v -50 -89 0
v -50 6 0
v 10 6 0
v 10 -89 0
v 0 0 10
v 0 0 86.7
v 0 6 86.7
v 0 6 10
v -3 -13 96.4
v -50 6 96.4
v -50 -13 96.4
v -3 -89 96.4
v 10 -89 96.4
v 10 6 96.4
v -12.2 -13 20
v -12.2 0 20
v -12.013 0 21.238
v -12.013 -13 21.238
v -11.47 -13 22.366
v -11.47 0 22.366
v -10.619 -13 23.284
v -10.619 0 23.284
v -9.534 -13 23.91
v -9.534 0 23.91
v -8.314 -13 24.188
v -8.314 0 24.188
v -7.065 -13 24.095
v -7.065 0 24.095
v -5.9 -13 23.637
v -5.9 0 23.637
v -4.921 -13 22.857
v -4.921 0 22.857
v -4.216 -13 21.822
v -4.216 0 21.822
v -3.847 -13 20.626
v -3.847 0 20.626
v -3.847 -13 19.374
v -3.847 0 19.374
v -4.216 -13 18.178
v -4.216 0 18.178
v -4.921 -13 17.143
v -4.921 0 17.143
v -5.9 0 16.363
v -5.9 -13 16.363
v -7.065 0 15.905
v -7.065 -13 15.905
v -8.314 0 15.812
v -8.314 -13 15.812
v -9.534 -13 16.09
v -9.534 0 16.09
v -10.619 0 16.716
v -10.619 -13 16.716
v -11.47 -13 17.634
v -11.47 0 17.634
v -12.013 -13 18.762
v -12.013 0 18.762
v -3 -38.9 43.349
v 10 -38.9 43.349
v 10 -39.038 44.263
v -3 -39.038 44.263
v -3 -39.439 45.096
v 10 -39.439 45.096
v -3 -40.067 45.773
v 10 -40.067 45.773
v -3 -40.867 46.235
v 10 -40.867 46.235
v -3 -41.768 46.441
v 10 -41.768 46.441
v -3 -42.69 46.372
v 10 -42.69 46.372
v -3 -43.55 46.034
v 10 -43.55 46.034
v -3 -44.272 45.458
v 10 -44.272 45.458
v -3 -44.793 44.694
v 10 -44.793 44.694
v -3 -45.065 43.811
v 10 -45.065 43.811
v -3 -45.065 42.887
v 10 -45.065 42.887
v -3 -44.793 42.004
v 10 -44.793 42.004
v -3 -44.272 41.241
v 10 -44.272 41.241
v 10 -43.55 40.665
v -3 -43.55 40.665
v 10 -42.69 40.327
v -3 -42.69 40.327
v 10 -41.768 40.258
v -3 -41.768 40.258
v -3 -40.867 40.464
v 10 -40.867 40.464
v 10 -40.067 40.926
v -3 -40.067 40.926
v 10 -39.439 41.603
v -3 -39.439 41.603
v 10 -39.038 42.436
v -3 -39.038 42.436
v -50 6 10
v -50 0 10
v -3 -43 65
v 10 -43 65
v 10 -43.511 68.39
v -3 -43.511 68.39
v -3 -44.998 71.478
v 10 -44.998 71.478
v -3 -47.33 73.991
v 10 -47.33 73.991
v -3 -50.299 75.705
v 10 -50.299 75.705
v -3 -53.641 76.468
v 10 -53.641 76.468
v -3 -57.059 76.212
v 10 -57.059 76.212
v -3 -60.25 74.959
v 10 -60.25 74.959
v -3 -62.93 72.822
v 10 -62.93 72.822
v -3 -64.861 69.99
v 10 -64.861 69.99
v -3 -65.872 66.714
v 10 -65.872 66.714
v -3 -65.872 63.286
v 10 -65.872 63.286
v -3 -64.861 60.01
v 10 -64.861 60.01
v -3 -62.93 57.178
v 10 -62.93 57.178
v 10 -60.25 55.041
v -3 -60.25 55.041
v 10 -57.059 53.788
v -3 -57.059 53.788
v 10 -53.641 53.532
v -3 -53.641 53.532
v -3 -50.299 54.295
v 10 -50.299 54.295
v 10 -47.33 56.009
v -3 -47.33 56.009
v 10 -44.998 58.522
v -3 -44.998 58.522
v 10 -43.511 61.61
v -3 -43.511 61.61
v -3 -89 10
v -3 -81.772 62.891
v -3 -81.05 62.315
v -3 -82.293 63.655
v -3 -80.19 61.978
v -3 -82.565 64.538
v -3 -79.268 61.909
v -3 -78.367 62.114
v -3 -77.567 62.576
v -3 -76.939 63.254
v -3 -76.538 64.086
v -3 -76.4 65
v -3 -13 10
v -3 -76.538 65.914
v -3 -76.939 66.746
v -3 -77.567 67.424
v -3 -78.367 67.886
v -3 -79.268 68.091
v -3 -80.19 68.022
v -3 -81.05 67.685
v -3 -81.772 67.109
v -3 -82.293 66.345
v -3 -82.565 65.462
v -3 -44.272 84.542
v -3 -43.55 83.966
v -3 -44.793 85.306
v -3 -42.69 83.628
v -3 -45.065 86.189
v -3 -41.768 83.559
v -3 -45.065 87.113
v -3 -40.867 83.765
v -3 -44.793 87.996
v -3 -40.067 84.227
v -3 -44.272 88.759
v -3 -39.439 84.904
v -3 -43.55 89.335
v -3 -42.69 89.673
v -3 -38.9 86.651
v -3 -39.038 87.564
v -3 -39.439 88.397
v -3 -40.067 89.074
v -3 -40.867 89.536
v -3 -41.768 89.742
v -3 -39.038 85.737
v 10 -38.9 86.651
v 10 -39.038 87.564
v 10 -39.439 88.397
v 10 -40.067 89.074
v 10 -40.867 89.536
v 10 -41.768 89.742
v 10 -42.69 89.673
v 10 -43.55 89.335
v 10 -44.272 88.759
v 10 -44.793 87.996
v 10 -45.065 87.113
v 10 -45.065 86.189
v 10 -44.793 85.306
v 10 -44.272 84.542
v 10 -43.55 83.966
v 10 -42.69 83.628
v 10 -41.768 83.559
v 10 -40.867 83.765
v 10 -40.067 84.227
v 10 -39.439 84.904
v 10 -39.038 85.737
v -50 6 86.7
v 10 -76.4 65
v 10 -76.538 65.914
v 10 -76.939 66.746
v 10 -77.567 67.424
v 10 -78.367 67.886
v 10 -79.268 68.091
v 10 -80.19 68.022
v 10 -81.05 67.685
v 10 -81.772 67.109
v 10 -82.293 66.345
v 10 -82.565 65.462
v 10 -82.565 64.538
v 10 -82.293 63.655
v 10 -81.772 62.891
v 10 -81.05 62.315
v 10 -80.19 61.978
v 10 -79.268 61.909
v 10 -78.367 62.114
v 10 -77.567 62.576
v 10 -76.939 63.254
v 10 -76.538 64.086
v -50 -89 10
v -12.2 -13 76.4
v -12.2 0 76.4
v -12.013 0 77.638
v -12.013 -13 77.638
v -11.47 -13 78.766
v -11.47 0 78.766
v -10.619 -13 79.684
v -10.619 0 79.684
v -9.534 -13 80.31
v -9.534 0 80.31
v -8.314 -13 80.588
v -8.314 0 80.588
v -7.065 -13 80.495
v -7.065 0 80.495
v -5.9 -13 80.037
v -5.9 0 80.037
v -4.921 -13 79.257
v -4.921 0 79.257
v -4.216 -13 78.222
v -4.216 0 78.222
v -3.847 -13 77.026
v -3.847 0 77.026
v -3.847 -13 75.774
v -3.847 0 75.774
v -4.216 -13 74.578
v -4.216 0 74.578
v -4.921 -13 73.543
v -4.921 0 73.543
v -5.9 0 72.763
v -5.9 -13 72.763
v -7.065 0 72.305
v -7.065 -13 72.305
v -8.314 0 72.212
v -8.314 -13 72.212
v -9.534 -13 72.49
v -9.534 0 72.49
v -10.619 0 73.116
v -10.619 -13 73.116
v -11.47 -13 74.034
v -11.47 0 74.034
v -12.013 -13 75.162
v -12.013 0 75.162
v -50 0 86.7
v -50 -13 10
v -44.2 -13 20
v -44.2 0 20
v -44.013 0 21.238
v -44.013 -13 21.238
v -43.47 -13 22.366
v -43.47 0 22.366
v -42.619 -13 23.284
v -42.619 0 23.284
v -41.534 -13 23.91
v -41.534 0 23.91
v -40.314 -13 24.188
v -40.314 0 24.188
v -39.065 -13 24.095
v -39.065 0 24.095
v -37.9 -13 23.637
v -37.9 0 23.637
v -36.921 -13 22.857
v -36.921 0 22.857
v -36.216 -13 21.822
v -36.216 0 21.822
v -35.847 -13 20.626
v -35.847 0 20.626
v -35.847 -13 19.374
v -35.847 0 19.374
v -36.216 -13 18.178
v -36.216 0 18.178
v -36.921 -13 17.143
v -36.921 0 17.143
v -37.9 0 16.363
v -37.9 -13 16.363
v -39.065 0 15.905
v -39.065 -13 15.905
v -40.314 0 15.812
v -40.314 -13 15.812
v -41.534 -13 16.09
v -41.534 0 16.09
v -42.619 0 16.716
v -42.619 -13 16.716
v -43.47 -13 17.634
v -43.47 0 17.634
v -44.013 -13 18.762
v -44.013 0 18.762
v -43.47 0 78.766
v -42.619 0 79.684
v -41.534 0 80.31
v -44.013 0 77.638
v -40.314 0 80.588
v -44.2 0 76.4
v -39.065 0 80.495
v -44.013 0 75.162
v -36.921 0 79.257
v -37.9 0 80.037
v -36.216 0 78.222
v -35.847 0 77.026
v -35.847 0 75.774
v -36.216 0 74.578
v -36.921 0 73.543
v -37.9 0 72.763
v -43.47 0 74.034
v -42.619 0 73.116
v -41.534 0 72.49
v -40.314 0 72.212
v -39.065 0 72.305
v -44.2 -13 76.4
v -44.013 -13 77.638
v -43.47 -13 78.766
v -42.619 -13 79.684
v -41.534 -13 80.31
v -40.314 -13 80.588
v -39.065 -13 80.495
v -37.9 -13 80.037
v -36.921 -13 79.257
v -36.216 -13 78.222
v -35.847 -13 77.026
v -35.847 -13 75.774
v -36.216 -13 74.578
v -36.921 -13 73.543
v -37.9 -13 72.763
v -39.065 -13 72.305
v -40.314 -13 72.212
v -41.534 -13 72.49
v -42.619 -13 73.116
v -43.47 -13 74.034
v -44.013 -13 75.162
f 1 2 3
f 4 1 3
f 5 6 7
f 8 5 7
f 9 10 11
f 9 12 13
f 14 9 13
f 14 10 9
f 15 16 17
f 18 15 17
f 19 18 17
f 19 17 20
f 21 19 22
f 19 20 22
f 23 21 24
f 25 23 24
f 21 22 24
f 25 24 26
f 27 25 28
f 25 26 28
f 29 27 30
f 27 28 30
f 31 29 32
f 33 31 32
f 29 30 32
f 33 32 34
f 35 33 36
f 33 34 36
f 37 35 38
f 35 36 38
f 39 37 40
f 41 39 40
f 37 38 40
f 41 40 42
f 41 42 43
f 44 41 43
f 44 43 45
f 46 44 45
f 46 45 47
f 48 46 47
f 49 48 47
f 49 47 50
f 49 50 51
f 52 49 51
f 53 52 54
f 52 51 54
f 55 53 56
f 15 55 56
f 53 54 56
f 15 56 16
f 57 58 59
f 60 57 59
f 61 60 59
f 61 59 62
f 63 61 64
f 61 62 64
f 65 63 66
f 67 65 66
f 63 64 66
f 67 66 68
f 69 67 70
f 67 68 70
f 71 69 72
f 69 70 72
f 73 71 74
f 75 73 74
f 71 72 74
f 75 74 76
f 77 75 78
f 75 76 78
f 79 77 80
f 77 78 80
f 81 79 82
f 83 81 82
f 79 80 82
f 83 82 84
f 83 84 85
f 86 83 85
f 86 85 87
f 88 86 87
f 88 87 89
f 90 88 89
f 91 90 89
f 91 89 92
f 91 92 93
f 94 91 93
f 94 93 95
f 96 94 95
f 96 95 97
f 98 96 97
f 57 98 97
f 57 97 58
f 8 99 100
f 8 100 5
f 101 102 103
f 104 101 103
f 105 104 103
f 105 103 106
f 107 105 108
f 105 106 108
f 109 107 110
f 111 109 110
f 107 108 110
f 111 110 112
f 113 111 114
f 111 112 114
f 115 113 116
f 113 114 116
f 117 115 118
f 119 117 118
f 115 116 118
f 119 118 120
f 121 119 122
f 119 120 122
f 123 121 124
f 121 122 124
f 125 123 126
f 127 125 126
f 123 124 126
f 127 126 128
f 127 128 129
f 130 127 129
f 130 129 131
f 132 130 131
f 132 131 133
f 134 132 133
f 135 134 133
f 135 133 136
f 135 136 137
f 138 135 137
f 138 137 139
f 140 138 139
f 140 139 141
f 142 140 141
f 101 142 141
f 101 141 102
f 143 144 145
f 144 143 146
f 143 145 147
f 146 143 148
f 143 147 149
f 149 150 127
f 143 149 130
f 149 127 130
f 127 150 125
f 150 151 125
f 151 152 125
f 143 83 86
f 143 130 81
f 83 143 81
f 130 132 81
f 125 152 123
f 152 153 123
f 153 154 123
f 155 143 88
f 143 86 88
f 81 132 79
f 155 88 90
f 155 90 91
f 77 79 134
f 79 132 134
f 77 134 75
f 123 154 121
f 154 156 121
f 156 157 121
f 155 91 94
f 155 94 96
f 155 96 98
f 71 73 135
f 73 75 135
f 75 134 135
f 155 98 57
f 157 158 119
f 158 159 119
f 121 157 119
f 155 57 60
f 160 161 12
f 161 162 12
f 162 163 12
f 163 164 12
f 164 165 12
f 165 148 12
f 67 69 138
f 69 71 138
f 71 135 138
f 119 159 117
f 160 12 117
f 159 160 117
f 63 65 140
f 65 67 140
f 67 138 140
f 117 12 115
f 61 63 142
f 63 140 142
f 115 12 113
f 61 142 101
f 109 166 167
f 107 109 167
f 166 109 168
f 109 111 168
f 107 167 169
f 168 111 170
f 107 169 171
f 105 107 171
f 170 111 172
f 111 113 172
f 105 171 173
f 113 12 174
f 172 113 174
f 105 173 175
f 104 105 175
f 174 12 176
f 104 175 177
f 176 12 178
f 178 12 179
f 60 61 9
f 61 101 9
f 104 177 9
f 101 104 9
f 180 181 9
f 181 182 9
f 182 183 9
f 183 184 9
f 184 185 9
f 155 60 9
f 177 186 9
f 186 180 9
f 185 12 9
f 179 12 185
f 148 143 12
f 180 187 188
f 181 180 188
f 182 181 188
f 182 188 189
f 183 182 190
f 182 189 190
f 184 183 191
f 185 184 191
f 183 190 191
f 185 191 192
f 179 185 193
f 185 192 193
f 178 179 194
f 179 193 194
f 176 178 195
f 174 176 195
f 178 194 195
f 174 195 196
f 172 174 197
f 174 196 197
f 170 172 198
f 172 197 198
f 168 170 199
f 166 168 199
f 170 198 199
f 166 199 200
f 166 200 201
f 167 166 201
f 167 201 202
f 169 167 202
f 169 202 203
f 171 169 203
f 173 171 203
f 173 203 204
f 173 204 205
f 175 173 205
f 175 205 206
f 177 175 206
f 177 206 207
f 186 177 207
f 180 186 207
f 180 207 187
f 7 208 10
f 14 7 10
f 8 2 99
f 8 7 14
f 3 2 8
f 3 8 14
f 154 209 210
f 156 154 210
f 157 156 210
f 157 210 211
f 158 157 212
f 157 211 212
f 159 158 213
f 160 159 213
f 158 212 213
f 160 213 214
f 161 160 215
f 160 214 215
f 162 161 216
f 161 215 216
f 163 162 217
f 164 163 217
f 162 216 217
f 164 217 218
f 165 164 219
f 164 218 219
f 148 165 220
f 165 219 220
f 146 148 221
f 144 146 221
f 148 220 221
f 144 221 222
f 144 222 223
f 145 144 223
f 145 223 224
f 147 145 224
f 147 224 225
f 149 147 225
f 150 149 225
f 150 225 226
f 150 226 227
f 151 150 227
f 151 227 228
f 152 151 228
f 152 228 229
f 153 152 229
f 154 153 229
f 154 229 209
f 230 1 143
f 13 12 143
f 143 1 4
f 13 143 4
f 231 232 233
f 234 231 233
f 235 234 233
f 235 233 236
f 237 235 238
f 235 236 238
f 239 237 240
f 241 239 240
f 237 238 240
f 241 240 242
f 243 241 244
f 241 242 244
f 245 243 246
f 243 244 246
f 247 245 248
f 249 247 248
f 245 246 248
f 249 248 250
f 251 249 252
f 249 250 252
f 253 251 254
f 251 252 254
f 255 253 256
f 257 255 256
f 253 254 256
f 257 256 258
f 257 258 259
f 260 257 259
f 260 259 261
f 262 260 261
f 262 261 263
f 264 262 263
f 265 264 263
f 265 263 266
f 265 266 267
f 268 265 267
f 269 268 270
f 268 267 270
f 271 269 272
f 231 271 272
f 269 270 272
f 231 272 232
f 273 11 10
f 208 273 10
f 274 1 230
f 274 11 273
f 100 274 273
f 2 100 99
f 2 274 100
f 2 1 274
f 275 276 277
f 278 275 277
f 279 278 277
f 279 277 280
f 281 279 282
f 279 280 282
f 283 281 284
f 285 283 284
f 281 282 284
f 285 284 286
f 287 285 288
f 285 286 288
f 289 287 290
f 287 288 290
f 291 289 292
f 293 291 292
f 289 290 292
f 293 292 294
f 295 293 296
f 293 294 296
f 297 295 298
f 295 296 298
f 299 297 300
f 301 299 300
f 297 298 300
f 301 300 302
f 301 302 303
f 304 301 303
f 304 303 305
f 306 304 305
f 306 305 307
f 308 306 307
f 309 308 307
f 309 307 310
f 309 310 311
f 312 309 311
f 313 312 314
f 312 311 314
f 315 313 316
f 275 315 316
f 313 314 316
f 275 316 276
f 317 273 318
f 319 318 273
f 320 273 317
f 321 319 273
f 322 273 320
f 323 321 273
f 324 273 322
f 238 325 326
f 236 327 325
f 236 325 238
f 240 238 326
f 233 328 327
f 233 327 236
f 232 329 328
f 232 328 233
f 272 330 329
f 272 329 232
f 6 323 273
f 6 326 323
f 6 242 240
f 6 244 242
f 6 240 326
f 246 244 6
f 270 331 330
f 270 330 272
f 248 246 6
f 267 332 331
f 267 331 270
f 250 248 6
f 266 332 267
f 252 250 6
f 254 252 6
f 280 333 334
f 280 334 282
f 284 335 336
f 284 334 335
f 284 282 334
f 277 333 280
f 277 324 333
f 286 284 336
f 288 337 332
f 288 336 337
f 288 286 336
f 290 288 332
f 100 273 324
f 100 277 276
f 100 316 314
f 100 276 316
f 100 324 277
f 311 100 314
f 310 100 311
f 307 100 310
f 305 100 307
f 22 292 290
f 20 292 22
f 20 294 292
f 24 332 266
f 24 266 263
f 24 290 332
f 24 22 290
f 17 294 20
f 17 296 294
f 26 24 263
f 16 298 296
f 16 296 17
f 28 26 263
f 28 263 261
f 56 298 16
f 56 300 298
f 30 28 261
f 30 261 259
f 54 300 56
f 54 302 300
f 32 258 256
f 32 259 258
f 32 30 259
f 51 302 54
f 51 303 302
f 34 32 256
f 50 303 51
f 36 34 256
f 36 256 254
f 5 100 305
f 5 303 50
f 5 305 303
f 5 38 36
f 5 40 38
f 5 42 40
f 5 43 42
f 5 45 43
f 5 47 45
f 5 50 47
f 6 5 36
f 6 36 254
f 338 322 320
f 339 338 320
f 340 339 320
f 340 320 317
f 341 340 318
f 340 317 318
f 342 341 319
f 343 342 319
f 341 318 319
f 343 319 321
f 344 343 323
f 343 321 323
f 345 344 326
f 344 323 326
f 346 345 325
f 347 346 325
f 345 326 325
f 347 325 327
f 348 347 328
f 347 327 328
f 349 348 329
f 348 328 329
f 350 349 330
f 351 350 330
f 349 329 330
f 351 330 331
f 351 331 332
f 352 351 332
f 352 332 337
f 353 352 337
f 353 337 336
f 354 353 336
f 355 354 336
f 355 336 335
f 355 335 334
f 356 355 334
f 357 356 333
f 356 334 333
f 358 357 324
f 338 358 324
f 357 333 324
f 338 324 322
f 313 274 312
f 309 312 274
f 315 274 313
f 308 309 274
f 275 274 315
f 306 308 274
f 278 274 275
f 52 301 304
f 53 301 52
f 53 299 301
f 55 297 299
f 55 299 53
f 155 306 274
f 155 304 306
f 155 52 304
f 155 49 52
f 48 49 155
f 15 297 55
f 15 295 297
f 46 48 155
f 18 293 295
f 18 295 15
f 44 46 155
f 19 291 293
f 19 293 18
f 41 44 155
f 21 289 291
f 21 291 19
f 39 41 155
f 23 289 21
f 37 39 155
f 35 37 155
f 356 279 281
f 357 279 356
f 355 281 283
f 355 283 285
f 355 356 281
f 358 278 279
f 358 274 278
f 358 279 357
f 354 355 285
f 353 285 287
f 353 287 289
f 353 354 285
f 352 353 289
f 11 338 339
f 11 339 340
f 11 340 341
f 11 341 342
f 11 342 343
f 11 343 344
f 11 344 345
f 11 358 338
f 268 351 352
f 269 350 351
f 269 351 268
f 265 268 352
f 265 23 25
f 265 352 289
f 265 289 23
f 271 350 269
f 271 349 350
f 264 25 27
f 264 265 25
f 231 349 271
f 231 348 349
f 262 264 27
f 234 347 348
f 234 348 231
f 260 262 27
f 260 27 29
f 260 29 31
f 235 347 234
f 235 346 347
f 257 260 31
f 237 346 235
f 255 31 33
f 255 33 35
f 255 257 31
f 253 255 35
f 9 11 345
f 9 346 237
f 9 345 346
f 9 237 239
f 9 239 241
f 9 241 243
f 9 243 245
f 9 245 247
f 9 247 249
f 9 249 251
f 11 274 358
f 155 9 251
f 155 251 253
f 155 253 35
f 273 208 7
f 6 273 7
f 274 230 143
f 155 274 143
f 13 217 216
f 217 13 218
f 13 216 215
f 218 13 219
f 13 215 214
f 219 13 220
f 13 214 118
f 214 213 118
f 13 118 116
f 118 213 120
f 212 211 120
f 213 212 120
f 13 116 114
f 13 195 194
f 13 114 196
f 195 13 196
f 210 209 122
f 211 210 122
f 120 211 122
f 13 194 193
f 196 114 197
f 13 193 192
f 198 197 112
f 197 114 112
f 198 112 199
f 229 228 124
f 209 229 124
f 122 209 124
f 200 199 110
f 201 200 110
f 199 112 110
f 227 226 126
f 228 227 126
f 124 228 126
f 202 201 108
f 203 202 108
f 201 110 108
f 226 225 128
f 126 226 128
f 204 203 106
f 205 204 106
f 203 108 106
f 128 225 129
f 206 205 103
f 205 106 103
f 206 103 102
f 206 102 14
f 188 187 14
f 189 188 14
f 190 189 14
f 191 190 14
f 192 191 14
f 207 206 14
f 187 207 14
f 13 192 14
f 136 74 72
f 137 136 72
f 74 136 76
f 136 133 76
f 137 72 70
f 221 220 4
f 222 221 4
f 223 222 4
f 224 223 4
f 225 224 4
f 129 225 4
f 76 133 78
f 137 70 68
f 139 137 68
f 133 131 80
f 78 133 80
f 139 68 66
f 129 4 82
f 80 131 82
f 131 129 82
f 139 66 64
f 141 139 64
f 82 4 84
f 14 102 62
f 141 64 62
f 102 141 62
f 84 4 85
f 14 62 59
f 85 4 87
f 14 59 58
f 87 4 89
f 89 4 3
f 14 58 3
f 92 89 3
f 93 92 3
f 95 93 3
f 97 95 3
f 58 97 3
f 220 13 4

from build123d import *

# Parameters (mm, degrees)
BOX_W           = 100
BOX_H           = 6
BOX_DEPTH       = 76.7
SKETCH_W        = 60
SKETCH_H        = 95
PAD_DEPTH       = 96.4
SKETCH001_W     = 90
SKETCH001_H     = 90
POCKET_DEPTH    = 86.4
SKETCH003_R     = 11.5
SKETCH003_R_2   = 3.1
POCKET001_DEPTH = 20
SKETCH004_R     = 4.2
POCKET002_DEPTH = 13


with BuildPart() as crossbeam_slot:
    # Box → Box (new body)
    with BuildSketch(Plane(origin=(-100, 0, 10), x_dir=(1, 0, 0), z_dir=(0, 0, 1))):
        with Locations((50, 3)):
            Rectangle(BOX_W, BOX_H)
    extrude(amount=BOX_DEPTH)


with BuildPart() as pocket002:
    # Sketch → Pad (new body)
    with BuildSketch(Plane.XY):
        with Locations((-20, -41.5)):
            Rectangle(SKETCH_W, SKETCH_H)
    extrude(amount=PAD_DEPTH)

    # Cut: cut Crossbeam Slot
    add(crossbeam_slot.part, mode=Mode.SUBTRACT)

    # Sketch001 → Pocket (cut)
    with BuildSketch(Plane.XY.offset(96.4)):
        with Locations((-48, -58)):
            Rectangle(SKETCH001_W, SKETCH001_H)
    extrude(amount=-POCKET_DEPTH, mode=Mode.SUBTRACT)

    # Sketch003 → Pocket001 (cut)
    with BuildSketch(Plane.YZ.offset(10)):
        with Locations((-54.5, 65)):
            Circle(SKETCH003_R)
        with Locations((-42, 43.349365)):
            Circle(SKETCH003_R_2)
        with Locations((-42, 86.650635)):
            Circle(SKETCH003_R_2)
        with Locations((-79.5, 65)):
            Circle(SKETCH003_R_2)
    extrude(amount=-POCKET001_DEPTH, mode=Mode.SUBTRACT)

    # Sketch004 → Pocket002 (cut)
    with BuildSketch(Plane(origin=(0, 0, 0), x_dir=(-1, 0, 0), z_dir=(0, 1, 0))):
        with Locations((8, 76.4)):
            Circle(SKETCH004_R)
        with Locations((40, 76.4)):
            Circle(SKETCH004_R)
        with Locations((8, 20)):
            Circle(SKETCH004_R)
        with Locations((40, 20)):
            Circle(SKETCH004_R)
    extrude(amount=-POCKET002_DEPTH, mode=Mode.SUBTRACT)


solid = pocket002.part
